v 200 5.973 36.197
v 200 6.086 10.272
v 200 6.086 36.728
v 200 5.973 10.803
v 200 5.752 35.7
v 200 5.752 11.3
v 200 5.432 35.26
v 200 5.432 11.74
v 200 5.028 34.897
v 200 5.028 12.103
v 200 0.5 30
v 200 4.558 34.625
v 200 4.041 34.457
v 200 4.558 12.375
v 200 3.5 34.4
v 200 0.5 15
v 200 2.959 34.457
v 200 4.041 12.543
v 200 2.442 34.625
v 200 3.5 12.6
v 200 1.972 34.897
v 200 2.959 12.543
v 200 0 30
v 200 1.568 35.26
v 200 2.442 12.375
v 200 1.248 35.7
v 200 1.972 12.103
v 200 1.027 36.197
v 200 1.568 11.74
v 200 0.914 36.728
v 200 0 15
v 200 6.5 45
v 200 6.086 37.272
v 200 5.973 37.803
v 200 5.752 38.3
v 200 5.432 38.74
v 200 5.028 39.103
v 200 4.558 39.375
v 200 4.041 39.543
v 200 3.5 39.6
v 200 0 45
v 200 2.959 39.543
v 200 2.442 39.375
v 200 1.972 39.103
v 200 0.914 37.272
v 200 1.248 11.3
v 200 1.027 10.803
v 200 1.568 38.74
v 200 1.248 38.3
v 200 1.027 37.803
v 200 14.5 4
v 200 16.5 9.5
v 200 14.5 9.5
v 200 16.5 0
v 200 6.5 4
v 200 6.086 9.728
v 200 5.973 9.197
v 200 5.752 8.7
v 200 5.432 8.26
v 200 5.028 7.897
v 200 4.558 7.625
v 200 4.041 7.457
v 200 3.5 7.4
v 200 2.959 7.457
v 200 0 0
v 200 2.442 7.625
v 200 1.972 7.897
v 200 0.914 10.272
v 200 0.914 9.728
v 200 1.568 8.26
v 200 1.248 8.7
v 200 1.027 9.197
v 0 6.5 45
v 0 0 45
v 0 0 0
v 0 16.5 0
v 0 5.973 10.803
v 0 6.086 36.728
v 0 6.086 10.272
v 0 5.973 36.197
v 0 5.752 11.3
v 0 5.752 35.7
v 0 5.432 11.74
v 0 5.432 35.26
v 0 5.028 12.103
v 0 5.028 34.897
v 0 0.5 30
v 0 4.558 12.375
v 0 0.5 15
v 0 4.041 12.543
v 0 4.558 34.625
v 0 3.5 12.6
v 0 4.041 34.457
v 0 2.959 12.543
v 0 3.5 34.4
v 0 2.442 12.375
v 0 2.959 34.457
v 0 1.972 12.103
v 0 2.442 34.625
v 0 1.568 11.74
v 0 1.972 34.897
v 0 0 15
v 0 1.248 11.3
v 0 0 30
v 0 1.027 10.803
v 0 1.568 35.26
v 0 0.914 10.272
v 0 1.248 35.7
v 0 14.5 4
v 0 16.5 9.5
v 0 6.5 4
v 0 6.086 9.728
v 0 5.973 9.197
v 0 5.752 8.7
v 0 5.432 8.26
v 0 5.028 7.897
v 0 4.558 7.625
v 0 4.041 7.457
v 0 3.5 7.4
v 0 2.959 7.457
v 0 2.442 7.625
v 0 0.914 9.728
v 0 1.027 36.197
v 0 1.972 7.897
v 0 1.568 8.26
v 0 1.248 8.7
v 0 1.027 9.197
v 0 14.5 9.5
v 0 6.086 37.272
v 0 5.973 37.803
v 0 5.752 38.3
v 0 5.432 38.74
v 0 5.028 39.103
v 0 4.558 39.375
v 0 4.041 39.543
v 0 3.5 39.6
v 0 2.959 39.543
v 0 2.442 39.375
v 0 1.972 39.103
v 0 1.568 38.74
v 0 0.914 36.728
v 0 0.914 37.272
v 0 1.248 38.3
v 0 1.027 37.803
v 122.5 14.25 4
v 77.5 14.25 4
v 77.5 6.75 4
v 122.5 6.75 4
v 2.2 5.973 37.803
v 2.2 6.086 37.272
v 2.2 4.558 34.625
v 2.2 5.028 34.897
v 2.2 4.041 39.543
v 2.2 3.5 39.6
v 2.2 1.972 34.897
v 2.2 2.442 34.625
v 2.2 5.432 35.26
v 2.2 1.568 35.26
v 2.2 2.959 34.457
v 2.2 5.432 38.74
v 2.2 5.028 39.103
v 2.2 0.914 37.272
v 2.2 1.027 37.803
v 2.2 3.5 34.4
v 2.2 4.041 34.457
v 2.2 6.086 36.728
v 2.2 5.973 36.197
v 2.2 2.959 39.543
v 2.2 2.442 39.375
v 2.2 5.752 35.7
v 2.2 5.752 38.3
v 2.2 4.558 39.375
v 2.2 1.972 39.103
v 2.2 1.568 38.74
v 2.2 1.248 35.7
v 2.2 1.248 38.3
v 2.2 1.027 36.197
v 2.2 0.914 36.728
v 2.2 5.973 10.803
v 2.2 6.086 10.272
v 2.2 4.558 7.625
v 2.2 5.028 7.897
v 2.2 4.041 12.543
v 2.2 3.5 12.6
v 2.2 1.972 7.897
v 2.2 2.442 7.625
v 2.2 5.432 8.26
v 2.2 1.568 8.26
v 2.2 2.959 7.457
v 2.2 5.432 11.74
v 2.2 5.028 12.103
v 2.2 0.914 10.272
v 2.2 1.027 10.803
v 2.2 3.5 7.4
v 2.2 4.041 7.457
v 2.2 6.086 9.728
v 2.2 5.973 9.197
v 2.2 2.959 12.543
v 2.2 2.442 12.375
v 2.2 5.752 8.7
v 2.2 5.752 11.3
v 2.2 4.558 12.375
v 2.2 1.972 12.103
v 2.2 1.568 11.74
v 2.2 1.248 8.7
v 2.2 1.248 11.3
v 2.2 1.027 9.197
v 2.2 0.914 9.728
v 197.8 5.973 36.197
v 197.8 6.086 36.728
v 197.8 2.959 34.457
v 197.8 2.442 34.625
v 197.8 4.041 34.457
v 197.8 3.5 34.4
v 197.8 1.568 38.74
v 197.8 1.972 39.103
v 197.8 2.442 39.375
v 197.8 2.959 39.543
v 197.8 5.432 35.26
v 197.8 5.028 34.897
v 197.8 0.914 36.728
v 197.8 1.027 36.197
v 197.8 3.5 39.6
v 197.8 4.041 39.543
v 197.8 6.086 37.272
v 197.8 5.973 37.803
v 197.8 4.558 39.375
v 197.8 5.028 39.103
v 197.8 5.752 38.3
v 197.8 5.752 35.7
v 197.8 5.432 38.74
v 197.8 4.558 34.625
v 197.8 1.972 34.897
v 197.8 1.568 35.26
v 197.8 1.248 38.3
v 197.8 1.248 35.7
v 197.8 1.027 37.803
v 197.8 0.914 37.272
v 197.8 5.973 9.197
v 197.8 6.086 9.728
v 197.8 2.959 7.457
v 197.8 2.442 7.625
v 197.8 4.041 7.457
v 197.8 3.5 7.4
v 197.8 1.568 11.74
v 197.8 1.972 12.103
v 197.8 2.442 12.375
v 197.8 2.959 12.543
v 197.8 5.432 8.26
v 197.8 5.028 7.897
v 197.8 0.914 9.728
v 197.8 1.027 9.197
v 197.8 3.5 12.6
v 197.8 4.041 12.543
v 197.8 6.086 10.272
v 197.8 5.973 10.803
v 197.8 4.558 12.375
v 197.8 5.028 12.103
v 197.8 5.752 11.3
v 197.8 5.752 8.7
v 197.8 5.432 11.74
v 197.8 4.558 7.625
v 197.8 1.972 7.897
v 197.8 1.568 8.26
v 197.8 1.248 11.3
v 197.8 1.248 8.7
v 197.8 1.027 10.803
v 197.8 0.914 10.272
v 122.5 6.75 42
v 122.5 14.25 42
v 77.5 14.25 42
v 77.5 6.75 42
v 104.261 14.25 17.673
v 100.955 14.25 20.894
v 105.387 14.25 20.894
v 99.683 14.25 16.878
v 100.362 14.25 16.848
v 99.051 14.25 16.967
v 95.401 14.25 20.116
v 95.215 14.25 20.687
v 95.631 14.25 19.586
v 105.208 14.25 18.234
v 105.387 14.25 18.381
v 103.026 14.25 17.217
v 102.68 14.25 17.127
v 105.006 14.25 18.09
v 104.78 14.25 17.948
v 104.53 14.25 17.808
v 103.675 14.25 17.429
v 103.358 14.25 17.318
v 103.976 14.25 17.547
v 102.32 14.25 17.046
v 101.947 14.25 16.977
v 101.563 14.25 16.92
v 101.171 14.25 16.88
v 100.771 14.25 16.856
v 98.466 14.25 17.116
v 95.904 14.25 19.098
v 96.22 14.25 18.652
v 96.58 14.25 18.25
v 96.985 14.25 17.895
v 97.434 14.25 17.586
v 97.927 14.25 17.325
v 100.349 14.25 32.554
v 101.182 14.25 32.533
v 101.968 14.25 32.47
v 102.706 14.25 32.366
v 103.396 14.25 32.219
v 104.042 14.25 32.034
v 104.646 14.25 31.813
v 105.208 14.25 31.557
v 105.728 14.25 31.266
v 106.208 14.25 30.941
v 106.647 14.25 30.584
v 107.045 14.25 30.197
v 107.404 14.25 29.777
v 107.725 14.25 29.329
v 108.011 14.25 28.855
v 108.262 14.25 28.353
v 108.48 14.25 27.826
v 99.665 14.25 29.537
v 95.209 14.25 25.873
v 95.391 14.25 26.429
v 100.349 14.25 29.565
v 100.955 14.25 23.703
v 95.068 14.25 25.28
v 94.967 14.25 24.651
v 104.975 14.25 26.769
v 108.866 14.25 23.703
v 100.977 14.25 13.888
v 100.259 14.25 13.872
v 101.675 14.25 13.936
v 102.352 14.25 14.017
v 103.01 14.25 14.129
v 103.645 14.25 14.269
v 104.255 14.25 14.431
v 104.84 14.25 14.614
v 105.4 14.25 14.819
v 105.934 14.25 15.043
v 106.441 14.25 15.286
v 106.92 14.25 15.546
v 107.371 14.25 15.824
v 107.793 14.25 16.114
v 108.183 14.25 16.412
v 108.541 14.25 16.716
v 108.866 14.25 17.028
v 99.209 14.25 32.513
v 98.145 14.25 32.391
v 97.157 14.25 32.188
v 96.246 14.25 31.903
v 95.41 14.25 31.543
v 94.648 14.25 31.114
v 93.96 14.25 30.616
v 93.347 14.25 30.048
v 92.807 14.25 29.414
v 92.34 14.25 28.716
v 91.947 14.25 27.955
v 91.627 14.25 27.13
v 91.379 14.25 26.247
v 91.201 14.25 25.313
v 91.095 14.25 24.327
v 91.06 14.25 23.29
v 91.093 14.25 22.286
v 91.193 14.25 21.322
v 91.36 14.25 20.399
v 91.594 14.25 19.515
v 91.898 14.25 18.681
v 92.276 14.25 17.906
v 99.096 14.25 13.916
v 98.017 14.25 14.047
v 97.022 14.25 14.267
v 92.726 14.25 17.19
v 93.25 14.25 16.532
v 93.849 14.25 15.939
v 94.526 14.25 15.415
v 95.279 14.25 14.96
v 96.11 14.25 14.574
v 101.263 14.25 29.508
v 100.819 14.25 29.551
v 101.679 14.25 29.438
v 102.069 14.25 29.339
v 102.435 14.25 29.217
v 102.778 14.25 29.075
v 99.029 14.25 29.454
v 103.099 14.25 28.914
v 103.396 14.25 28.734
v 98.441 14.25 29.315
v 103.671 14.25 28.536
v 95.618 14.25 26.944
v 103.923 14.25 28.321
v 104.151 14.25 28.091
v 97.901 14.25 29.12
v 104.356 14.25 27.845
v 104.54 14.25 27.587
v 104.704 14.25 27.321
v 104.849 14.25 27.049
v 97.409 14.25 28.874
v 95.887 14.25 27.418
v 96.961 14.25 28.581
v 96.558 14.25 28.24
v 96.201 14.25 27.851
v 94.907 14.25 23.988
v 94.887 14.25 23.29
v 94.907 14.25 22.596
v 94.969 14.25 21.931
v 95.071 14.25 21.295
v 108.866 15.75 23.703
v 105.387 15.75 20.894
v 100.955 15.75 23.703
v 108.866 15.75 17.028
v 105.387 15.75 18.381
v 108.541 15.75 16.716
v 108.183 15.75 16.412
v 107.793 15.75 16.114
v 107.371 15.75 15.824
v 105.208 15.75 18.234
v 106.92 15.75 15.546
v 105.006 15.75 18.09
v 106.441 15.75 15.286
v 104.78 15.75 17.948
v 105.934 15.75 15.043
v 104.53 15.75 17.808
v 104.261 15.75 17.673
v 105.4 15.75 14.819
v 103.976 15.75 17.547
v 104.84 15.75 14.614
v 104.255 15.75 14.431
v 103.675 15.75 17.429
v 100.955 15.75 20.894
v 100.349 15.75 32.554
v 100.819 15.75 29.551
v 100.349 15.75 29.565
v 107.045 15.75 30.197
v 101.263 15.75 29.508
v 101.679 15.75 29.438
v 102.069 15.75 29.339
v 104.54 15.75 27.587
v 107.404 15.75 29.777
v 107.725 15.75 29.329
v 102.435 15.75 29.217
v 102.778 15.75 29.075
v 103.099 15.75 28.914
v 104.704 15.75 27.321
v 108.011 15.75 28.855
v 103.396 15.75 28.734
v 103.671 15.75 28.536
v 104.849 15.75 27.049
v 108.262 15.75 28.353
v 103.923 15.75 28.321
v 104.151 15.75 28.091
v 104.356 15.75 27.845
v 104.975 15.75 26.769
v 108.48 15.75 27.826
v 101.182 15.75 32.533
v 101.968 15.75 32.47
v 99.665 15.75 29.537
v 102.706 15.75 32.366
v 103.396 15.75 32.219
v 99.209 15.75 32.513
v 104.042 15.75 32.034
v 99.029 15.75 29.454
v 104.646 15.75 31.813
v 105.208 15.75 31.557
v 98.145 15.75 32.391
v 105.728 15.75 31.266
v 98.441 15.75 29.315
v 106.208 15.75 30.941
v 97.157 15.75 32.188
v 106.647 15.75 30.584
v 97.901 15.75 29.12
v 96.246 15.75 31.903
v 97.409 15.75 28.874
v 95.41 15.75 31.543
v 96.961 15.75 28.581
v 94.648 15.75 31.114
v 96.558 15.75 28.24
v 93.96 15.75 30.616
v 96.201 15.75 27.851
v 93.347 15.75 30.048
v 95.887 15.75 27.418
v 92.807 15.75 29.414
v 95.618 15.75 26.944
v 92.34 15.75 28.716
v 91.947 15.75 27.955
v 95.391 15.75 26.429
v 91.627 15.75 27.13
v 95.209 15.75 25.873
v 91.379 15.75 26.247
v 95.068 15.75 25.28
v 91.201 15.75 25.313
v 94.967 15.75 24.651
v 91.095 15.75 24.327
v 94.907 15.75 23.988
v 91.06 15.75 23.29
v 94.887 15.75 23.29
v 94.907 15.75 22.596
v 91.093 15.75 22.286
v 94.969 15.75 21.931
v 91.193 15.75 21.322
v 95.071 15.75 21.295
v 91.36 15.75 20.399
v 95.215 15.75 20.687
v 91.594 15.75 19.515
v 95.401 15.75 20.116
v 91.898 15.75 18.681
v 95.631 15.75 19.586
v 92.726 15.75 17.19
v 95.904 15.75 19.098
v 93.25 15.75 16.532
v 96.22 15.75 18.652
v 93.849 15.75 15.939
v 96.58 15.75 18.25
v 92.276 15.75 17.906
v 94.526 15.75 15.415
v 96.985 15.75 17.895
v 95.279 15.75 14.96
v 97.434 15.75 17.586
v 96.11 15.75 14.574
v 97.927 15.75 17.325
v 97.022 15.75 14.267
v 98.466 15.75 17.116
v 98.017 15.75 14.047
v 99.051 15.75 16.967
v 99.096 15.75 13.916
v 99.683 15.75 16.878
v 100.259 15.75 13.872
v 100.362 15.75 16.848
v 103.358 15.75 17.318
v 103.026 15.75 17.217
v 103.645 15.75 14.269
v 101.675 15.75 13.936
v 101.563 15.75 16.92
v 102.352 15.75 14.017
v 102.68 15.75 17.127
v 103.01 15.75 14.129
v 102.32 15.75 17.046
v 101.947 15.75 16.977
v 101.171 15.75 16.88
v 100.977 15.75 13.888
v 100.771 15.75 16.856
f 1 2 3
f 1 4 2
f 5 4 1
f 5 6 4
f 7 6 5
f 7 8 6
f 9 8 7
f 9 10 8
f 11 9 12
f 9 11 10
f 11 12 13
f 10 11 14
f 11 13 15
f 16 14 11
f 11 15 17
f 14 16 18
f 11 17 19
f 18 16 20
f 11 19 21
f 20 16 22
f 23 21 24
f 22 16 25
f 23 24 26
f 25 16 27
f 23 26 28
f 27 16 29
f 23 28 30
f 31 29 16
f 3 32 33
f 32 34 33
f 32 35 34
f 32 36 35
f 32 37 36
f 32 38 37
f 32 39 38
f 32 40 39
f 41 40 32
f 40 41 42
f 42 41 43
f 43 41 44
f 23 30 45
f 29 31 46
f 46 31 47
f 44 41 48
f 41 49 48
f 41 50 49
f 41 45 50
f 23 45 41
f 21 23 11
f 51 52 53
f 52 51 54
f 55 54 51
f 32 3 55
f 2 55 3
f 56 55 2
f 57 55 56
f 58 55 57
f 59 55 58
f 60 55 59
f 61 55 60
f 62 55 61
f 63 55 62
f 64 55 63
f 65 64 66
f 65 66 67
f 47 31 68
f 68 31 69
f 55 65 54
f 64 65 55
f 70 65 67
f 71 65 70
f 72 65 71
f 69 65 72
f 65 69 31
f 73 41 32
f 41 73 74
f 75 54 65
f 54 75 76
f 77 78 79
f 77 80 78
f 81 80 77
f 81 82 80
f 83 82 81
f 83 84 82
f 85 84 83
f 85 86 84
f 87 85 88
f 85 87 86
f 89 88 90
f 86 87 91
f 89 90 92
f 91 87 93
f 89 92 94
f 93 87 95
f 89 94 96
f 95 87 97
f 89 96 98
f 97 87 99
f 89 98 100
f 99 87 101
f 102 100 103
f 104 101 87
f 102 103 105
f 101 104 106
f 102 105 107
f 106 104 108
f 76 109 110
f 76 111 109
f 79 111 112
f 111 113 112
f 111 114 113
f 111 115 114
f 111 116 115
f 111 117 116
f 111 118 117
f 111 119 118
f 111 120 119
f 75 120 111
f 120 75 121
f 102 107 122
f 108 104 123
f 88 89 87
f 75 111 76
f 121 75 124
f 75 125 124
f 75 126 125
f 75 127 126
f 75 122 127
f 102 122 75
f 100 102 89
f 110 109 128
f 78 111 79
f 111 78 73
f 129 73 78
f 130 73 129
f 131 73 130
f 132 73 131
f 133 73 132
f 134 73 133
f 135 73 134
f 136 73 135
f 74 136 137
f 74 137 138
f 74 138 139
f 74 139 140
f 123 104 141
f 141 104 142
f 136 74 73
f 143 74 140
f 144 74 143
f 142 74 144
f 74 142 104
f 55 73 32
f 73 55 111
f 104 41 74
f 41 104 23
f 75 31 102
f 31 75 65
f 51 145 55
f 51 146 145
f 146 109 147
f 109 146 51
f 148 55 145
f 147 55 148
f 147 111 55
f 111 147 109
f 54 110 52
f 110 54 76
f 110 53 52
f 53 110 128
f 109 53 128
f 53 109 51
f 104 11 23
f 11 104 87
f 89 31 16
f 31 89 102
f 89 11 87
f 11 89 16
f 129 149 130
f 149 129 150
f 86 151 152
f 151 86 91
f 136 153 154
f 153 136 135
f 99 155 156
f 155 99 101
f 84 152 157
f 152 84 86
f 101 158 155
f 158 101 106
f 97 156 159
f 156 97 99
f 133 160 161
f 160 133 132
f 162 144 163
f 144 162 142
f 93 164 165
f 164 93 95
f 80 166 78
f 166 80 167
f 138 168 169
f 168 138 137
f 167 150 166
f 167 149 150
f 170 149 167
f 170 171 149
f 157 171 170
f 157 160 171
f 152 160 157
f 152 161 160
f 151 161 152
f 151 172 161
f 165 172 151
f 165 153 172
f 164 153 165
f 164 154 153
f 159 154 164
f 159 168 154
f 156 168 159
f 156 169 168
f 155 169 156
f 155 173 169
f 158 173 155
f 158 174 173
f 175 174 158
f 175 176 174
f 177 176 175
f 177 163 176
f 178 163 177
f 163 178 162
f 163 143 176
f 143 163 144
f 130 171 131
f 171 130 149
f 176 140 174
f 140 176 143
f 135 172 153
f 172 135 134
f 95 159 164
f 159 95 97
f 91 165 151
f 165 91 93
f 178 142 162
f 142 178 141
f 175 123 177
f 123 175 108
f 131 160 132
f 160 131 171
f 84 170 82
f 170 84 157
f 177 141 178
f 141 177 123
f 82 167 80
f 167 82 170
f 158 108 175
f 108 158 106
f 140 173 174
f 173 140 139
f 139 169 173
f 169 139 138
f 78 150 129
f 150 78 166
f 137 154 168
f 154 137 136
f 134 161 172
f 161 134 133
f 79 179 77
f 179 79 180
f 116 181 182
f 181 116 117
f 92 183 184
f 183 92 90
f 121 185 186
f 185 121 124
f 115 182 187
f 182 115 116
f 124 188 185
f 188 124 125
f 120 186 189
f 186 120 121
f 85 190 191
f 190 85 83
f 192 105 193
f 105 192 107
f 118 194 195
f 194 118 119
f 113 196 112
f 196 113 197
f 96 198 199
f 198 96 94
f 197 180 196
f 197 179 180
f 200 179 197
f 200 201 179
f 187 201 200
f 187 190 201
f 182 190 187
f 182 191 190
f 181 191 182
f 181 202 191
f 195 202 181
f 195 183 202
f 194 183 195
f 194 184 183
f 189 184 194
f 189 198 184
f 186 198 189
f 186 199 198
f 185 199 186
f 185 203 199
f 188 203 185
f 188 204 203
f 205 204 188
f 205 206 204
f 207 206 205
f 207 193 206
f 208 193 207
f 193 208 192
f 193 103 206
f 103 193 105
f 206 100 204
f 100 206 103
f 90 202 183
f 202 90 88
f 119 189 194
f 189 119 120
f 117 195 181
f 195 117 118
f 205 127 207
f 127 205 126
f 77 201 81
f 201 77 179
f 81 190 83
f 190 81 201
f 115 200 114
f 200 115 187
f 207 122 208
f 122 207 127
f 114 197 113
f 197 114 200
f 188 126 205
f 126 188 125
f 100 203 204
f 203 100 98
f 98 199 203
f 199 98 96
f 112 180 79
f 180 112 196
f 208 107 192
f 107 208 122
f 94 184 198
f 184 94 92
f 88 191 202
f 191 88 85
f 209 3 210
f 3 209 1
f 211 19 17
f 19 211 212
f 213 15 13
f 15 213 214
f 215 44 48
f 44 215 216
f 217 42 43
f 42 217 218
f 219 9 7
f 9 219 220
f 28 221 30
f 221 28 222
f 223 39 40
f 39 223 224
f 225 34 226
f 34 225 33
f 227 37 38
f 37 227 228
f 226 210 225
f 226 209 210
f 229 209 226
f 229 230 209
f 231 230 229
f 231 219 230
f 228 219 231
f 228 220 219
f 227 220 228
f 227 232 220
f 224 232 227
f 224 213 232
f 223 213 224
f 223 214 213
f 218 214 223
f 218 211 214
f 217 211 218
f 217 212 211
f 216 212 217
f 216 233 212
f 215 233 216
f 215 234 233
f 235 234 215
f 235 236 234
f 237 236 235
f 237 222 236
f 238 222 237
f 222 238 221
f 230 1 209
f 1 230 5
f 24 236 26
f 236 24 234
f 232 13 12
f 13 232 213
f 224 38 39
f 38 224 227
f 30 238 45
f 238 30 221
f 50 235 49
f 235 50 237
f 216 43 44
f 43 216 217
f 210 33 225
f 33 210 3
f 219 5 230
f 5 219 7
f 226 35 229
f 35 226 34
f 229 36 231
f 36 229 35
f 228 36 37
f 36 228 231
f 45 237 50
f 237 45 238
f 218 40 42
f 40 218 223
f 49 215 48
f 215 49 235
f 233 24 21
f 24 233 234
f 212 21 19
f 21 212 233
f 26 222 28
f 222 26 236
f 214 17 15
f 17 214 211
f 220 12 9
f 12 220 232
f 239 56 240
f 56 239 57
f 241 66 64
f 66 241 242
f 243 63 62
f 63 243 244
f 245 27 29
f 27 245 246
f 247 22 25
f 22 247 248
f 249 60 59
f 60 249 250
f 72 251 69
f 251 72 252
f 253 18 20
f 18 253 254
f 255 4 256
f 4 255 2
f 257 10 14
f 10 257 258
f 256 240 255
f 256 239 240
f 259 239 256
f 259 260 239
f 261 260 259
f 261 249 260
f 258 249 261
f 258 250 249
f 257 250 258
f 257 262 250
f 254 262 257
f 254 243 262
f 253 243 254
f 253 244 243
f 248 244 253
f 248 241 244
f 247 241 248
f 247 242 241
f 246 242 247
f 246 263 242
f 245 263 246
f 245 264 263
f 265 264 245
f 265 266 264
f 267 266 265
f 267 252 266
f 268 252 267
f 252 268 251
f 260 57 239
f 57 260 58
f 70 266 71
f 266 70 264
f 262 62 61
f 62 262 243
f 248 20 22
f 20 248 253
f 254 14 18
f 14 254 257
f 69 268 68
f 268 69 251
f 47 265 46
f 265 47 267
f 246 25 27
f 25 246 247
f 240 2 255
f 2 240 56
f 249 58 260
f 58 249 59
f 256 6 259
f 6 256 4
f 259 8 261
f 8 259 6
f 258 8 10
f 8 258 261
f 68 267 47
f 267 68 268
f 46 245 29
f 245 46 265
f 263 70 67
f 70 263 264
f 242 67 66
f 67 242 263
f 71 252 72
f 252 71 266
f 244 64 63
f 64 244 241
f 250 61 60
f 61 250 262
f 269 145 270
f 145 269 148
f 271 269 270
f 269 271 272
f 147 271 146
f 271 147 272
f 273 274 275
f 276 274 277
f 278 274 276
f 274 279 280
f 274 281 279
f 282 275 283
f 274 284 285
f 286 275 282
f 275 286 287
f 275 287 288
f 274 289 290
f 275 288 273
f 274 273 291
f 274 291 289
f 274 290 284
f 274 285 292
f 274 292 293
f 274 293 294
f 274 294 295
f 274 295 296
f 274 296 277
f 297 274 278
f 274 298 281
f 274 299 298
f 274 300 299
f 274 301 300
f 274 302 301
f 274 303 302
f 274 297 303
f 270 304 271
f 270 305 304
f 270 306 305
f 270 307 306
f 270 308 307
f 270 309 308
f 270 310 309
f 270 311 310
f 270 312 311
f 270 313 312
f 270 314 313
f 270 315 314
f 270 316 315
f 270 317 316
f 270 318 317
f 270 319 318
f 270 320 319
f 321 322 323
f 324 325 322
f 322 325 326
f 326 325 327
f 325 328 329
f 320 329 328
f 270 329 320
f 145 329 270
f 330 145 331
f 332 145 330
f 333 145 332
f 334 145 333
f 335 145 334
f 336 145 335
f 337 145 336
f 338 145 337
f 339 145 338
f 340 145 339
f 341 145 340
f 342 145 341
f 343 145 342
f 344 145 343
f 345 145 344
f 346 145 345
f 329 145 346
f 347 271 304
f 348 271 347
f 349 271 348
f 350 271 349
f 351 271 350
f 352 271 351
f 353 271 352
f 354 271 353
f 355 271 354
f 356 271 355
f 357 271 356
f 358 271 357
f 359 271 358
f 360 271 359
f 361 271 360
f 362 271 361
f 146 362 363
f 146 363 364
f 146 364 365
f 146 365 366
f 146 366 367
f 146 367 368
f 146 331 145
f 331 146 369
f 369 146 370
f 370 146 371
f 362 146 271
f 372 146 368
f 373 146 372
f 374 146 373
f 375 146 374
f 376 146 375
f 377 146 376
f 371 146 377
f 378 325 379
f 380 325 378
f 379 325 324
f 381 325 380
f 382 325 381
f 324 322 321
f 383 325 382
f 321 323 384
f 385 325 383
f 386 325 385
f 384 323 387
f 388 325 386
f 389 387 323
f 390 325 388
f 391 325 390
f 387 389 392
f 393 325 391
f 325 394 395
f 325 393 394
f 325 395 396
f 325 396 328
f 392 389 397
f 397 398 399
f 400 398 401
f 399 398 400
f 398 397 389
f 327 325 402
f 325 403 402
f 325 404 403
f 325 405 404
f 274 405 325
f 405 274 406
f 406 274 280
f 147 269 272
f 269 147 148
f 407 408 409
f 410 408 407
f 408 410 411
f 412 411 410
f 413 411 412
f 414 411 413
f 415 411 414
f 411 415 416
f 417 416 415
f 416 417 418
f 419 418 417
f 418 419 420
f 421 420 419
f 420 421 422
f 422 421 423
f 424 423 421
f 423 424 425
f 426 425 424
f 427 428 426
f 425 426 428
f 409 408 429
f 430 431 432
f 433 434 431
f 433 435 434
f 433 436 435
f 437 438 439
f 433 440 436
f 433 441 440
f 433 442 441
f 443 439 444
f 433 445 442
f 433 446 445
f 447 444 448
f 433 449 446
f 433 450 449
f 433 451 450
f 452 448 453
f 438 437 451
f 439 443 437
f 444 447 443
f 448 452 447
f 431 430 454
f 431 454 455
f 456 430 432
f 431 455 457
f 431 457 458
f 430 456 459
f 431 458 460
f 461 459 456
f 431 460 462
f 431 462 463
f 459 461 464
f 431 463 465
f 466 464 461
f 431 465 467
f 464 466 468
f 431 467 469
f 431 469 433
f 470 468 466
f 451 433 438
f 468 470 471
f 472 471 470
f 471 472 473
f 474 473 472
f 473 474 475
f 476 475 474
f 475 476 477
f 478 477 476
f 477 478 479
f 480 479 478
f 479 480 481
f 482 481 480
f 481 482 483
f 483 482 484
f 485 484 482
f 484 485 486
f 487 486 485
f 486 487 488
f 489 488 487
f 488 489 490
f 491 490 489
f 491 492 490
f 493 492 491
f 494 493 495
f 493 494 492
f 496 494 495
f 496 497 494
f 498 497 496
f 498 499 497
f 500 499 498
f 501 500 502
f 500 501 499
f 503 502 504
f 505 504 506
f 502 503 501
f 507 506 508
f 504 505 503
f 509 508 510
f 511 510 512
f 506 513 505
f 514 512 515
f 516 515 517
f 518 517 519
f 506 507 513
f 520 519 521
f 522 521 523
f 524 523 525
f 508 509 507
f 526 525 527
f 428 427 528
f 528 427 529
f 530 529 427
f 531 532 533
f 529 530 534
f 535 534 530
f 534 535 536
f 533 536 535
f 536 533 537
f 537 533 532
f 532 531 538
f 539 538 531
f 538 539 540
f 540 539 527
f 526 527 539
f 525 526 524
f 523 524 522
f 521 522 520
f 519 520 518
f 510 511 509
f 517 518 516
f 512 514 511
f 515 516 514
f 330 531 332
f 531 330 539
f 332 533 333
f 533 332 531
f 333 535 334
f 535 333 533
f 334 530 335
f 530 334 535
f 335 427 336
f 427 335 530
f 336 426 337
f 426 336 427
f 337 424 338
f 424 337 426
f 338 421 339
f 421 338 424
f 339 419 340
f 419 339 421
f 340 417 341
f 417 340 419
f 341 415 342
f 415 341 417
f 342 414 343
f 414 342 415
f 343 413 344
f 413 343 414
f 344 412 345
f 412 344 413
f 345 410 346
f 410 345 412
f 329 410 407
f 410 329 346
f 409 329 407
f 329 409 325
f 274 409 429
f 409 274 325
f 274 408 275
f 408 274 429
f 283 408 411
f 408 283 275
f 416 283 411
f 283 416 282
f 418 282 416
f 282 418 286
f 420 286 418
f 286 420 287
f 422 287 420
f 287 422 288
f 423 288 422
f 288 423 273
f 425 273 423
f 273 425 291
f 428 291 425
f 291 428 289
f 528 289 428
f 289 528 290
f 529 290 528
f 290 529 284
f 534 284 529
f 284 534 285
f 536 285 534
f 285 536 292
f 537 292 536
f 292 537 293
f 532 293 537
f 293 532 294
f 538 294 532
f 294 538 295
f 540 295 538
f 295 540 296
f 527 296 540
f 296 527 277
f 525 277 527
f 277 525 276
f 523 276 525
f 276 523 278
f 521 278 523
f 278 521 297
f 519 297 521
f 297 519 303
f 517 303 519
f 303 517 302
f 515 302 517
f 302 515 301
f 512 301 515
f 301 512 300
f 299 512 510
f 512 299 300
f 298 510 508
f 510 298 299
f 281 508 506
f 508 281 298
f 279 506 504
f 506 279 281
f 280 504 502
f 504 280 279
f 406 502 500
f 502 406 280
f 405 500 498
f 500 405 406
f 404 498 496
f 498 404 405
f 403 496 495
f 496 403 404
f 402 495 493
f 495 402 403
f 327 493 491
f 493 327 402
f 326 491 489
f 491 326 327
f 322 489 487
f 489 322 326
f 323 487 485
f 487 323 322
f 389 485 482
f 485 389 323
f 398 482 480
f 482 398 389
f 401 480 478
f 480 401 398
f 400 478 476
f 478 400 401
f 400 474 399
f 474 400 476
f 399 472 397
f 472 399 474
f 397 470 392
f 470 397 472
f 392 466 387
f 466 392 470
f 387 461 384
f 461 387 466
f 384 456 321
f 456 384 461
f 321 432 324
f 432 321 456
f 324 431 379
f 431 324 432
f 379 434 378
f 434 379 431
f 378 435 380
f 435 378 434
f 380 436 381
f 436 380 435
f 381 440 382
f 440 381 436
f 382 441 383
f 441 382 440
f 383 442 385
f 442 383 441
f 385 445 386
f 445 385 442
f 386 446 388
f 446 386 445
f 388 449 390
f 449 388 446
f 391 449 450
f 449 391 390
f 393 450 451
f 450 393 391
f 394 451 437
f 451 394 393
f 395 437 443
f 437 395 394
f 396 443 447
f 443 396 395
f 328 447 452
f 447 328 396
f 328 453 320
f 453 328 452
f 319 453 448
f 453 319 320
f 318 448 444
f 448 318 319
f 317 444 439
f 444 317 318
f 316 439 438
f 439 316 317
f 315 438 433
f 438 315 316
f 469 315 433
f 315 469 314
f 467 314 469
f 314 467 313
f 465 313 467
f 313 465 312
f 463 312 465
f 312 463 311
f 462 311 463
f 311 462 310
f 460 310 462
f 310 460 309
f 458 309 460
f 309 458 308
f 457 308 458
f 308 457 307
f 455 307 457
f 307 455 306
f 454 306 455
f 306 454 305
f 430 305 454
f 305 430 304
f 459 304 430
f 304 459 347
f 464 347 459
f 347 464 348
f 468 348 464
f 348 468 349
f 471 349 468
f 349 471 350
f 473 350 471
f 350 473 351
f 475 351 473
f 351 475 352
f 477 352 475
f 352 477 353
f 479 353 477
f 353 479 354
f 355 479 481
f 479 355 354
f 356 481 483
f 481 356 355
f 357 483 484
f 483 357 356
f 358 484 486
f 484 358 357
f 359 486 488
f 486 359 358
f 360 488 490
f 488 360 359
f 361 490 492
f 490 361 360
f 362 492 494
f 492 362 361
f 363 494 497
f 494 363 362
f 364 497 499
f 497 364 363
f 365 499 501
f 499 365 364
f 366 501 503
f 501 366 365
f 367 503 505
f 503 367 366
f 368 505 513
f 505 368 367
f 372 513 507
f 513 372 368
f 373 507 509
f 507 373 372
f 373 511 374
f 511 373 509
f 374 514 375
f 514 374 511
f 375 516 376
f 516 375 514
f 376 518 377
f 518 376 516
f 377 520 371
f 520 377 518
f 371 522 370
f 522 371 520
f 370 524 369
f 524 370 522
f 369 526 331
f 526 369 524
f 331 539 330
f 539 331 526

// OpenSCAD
/* PREMIUM L-SHAPED MODULAR MENU RAIL
   Includes Magnet Alignment & Tape Recess
*/

// --- VIEW CONTROLS ---
render_part = "assembly"; // [rail, tile, assembly, print_rail]

// --- RAIL PARAMETERS ---
rail_length = 200;       // Length of this section
rail_height = 45;        // Total height against the wall
rail_thickness = 6.5;    // Backplate thickness (must be > 5mm to hide magnets + tape)
shelf_width = 8.0;       // Usable depth of the shelf where letters sit
shelf_height = 4.0;      // Thickness of the bottom shelf
lip_width = 2.0;         // Thickness of the front retaining lip
lip_height = 5.5;        // Height of the front retaining lip

// --- MAGNET ALIGNMENT PARAMETERS ---
// Designed for standard 5x2mm cylindrical neodymium magnets
magnet_dia = 5.2;        // 0.2mm tolerance for easy supergluing
magnet_depth = 2.2;      // 0.2mm tolerance to ensure magnets sit flush or slightly sub-flush

// --- TAPE RECESS PARAMETERS ---
tape_width = 15;         // Width of your 3M tape
tape_depth = 0.5;        // Recess depth so the rail sits perfectly flush on the wall

// --- TILE PARAMETERS ---
tile_width = 45;
tile_height = 38;        // Fits cleanly inside the rail's vertical space
tile_thickness = 7.5;    // shelf_width minus 0.5mm tolerance for sliding
letter = "G";
font_name = "Arial:style=Bold";

// ==========================================

module premium_rail() {
    // Calculate the center Y position for the magnets
    // Tape takes 0.5mm from the back, so center is between 0.5 and rail_thickness
    mag_y = tape_depth + ((rail_thickness - tape_depth) / 2);
    
    difference() {
        // 1. MAIN RAIL BODIES
        union() {
            // The Backplate (Vertical)
            cube([rail_length, rail_thickness, rail_height]);
            
            // The Bottom Shelf (Horizontal)
            cube([rail_length, rail_thickness + shelf_width + lip_width, shelf_height]);
            
            // The Front Retaining Lip (Vertical)
            translate([0, rail_thickness + shelf_width, shelf_height])
                cube([rail_length, lip_width, lip_height]);
        }
        
        // 2. TAPE RECESS (Cut from the back face)
        // Recessed by tape_depth on the y=0 face, centered vertically
        translate([-1, -0.1, (rail_height - tape_width) / 2])
            cube([rail_length + 2, tape_depth + 0.1, tape_width]);
            
        // 3. LEFT MAGNET HOLES (x = 0)
        // Cut towards +X
        translate([-0.1, mag_y, rail_height - 8])
            rotate([0, 90, 0])
            cylinder(h=magnet_depth + 0.1, d=magnet_dia, $fn=30);
            
        translate([-0.1, mag_y, shelf_height + 6])
            rotate([0, 90, 0])
            cylinder(h=magnet_depth + 0.1, d=magnet_dia, $fn=30);
            
        // 4. RIGHT MAGNET HOLES (x = rail_length)
        // Cut towards -X
        translate([rail_length + 0.1, mag_y, rail_height - 8])
            rotate([0, -90, 0])
            cylinder(h=magnet_depth + 0.1, d=magnet_dia, $fn=30);
            
        translate([rail_length + 0.1, mag_y, shelf_height + 6])
            rotate([0, -90, 0])
            cylinder(h=magnet_depth + 0.1, d=magnet_dia, $fn=30);
    }
}

module premium_tile() {
    // The flat blank block
    cube([tile_width, tile_thickness, tile_height]);
    
    // Extrude the text on the front face
    // Extruding 1.5mm out from the tile face
    translate([tile_width/2, tile_thickness + 1.5, tile_height/2])
        rotate([90, 0, 0])
        linear_extrude(1.5)
        text(letter, font=font_name, size=tile_height*0.5, valign="center", halign="center");
}

// ==========================================
// RENDER LOGIC

if (render_part == "rail") {
    // Standard view
    color("DimGray") premium_rail();
} 
else if (render_part == "print_rail") {
    // Rotated to lay flat on the printer bed (backplate down)
    rotate([-90, 0, 0]) premium_rail();
}
else if (render_part == "tile") {
    // Print orientation for tile (back down)
    rotate([-90, 0, 0]) premium_tile();
} 
else if (render_part == "assembly") {
    // Rail
    color("DimGray") premium_rail();
    
    // Tile sitting in the shelf
    color("White")
    translate([(rail_length - tile_width)/2, rail_thickness + 0.25, shelf_height])
        premium_tile();
}
